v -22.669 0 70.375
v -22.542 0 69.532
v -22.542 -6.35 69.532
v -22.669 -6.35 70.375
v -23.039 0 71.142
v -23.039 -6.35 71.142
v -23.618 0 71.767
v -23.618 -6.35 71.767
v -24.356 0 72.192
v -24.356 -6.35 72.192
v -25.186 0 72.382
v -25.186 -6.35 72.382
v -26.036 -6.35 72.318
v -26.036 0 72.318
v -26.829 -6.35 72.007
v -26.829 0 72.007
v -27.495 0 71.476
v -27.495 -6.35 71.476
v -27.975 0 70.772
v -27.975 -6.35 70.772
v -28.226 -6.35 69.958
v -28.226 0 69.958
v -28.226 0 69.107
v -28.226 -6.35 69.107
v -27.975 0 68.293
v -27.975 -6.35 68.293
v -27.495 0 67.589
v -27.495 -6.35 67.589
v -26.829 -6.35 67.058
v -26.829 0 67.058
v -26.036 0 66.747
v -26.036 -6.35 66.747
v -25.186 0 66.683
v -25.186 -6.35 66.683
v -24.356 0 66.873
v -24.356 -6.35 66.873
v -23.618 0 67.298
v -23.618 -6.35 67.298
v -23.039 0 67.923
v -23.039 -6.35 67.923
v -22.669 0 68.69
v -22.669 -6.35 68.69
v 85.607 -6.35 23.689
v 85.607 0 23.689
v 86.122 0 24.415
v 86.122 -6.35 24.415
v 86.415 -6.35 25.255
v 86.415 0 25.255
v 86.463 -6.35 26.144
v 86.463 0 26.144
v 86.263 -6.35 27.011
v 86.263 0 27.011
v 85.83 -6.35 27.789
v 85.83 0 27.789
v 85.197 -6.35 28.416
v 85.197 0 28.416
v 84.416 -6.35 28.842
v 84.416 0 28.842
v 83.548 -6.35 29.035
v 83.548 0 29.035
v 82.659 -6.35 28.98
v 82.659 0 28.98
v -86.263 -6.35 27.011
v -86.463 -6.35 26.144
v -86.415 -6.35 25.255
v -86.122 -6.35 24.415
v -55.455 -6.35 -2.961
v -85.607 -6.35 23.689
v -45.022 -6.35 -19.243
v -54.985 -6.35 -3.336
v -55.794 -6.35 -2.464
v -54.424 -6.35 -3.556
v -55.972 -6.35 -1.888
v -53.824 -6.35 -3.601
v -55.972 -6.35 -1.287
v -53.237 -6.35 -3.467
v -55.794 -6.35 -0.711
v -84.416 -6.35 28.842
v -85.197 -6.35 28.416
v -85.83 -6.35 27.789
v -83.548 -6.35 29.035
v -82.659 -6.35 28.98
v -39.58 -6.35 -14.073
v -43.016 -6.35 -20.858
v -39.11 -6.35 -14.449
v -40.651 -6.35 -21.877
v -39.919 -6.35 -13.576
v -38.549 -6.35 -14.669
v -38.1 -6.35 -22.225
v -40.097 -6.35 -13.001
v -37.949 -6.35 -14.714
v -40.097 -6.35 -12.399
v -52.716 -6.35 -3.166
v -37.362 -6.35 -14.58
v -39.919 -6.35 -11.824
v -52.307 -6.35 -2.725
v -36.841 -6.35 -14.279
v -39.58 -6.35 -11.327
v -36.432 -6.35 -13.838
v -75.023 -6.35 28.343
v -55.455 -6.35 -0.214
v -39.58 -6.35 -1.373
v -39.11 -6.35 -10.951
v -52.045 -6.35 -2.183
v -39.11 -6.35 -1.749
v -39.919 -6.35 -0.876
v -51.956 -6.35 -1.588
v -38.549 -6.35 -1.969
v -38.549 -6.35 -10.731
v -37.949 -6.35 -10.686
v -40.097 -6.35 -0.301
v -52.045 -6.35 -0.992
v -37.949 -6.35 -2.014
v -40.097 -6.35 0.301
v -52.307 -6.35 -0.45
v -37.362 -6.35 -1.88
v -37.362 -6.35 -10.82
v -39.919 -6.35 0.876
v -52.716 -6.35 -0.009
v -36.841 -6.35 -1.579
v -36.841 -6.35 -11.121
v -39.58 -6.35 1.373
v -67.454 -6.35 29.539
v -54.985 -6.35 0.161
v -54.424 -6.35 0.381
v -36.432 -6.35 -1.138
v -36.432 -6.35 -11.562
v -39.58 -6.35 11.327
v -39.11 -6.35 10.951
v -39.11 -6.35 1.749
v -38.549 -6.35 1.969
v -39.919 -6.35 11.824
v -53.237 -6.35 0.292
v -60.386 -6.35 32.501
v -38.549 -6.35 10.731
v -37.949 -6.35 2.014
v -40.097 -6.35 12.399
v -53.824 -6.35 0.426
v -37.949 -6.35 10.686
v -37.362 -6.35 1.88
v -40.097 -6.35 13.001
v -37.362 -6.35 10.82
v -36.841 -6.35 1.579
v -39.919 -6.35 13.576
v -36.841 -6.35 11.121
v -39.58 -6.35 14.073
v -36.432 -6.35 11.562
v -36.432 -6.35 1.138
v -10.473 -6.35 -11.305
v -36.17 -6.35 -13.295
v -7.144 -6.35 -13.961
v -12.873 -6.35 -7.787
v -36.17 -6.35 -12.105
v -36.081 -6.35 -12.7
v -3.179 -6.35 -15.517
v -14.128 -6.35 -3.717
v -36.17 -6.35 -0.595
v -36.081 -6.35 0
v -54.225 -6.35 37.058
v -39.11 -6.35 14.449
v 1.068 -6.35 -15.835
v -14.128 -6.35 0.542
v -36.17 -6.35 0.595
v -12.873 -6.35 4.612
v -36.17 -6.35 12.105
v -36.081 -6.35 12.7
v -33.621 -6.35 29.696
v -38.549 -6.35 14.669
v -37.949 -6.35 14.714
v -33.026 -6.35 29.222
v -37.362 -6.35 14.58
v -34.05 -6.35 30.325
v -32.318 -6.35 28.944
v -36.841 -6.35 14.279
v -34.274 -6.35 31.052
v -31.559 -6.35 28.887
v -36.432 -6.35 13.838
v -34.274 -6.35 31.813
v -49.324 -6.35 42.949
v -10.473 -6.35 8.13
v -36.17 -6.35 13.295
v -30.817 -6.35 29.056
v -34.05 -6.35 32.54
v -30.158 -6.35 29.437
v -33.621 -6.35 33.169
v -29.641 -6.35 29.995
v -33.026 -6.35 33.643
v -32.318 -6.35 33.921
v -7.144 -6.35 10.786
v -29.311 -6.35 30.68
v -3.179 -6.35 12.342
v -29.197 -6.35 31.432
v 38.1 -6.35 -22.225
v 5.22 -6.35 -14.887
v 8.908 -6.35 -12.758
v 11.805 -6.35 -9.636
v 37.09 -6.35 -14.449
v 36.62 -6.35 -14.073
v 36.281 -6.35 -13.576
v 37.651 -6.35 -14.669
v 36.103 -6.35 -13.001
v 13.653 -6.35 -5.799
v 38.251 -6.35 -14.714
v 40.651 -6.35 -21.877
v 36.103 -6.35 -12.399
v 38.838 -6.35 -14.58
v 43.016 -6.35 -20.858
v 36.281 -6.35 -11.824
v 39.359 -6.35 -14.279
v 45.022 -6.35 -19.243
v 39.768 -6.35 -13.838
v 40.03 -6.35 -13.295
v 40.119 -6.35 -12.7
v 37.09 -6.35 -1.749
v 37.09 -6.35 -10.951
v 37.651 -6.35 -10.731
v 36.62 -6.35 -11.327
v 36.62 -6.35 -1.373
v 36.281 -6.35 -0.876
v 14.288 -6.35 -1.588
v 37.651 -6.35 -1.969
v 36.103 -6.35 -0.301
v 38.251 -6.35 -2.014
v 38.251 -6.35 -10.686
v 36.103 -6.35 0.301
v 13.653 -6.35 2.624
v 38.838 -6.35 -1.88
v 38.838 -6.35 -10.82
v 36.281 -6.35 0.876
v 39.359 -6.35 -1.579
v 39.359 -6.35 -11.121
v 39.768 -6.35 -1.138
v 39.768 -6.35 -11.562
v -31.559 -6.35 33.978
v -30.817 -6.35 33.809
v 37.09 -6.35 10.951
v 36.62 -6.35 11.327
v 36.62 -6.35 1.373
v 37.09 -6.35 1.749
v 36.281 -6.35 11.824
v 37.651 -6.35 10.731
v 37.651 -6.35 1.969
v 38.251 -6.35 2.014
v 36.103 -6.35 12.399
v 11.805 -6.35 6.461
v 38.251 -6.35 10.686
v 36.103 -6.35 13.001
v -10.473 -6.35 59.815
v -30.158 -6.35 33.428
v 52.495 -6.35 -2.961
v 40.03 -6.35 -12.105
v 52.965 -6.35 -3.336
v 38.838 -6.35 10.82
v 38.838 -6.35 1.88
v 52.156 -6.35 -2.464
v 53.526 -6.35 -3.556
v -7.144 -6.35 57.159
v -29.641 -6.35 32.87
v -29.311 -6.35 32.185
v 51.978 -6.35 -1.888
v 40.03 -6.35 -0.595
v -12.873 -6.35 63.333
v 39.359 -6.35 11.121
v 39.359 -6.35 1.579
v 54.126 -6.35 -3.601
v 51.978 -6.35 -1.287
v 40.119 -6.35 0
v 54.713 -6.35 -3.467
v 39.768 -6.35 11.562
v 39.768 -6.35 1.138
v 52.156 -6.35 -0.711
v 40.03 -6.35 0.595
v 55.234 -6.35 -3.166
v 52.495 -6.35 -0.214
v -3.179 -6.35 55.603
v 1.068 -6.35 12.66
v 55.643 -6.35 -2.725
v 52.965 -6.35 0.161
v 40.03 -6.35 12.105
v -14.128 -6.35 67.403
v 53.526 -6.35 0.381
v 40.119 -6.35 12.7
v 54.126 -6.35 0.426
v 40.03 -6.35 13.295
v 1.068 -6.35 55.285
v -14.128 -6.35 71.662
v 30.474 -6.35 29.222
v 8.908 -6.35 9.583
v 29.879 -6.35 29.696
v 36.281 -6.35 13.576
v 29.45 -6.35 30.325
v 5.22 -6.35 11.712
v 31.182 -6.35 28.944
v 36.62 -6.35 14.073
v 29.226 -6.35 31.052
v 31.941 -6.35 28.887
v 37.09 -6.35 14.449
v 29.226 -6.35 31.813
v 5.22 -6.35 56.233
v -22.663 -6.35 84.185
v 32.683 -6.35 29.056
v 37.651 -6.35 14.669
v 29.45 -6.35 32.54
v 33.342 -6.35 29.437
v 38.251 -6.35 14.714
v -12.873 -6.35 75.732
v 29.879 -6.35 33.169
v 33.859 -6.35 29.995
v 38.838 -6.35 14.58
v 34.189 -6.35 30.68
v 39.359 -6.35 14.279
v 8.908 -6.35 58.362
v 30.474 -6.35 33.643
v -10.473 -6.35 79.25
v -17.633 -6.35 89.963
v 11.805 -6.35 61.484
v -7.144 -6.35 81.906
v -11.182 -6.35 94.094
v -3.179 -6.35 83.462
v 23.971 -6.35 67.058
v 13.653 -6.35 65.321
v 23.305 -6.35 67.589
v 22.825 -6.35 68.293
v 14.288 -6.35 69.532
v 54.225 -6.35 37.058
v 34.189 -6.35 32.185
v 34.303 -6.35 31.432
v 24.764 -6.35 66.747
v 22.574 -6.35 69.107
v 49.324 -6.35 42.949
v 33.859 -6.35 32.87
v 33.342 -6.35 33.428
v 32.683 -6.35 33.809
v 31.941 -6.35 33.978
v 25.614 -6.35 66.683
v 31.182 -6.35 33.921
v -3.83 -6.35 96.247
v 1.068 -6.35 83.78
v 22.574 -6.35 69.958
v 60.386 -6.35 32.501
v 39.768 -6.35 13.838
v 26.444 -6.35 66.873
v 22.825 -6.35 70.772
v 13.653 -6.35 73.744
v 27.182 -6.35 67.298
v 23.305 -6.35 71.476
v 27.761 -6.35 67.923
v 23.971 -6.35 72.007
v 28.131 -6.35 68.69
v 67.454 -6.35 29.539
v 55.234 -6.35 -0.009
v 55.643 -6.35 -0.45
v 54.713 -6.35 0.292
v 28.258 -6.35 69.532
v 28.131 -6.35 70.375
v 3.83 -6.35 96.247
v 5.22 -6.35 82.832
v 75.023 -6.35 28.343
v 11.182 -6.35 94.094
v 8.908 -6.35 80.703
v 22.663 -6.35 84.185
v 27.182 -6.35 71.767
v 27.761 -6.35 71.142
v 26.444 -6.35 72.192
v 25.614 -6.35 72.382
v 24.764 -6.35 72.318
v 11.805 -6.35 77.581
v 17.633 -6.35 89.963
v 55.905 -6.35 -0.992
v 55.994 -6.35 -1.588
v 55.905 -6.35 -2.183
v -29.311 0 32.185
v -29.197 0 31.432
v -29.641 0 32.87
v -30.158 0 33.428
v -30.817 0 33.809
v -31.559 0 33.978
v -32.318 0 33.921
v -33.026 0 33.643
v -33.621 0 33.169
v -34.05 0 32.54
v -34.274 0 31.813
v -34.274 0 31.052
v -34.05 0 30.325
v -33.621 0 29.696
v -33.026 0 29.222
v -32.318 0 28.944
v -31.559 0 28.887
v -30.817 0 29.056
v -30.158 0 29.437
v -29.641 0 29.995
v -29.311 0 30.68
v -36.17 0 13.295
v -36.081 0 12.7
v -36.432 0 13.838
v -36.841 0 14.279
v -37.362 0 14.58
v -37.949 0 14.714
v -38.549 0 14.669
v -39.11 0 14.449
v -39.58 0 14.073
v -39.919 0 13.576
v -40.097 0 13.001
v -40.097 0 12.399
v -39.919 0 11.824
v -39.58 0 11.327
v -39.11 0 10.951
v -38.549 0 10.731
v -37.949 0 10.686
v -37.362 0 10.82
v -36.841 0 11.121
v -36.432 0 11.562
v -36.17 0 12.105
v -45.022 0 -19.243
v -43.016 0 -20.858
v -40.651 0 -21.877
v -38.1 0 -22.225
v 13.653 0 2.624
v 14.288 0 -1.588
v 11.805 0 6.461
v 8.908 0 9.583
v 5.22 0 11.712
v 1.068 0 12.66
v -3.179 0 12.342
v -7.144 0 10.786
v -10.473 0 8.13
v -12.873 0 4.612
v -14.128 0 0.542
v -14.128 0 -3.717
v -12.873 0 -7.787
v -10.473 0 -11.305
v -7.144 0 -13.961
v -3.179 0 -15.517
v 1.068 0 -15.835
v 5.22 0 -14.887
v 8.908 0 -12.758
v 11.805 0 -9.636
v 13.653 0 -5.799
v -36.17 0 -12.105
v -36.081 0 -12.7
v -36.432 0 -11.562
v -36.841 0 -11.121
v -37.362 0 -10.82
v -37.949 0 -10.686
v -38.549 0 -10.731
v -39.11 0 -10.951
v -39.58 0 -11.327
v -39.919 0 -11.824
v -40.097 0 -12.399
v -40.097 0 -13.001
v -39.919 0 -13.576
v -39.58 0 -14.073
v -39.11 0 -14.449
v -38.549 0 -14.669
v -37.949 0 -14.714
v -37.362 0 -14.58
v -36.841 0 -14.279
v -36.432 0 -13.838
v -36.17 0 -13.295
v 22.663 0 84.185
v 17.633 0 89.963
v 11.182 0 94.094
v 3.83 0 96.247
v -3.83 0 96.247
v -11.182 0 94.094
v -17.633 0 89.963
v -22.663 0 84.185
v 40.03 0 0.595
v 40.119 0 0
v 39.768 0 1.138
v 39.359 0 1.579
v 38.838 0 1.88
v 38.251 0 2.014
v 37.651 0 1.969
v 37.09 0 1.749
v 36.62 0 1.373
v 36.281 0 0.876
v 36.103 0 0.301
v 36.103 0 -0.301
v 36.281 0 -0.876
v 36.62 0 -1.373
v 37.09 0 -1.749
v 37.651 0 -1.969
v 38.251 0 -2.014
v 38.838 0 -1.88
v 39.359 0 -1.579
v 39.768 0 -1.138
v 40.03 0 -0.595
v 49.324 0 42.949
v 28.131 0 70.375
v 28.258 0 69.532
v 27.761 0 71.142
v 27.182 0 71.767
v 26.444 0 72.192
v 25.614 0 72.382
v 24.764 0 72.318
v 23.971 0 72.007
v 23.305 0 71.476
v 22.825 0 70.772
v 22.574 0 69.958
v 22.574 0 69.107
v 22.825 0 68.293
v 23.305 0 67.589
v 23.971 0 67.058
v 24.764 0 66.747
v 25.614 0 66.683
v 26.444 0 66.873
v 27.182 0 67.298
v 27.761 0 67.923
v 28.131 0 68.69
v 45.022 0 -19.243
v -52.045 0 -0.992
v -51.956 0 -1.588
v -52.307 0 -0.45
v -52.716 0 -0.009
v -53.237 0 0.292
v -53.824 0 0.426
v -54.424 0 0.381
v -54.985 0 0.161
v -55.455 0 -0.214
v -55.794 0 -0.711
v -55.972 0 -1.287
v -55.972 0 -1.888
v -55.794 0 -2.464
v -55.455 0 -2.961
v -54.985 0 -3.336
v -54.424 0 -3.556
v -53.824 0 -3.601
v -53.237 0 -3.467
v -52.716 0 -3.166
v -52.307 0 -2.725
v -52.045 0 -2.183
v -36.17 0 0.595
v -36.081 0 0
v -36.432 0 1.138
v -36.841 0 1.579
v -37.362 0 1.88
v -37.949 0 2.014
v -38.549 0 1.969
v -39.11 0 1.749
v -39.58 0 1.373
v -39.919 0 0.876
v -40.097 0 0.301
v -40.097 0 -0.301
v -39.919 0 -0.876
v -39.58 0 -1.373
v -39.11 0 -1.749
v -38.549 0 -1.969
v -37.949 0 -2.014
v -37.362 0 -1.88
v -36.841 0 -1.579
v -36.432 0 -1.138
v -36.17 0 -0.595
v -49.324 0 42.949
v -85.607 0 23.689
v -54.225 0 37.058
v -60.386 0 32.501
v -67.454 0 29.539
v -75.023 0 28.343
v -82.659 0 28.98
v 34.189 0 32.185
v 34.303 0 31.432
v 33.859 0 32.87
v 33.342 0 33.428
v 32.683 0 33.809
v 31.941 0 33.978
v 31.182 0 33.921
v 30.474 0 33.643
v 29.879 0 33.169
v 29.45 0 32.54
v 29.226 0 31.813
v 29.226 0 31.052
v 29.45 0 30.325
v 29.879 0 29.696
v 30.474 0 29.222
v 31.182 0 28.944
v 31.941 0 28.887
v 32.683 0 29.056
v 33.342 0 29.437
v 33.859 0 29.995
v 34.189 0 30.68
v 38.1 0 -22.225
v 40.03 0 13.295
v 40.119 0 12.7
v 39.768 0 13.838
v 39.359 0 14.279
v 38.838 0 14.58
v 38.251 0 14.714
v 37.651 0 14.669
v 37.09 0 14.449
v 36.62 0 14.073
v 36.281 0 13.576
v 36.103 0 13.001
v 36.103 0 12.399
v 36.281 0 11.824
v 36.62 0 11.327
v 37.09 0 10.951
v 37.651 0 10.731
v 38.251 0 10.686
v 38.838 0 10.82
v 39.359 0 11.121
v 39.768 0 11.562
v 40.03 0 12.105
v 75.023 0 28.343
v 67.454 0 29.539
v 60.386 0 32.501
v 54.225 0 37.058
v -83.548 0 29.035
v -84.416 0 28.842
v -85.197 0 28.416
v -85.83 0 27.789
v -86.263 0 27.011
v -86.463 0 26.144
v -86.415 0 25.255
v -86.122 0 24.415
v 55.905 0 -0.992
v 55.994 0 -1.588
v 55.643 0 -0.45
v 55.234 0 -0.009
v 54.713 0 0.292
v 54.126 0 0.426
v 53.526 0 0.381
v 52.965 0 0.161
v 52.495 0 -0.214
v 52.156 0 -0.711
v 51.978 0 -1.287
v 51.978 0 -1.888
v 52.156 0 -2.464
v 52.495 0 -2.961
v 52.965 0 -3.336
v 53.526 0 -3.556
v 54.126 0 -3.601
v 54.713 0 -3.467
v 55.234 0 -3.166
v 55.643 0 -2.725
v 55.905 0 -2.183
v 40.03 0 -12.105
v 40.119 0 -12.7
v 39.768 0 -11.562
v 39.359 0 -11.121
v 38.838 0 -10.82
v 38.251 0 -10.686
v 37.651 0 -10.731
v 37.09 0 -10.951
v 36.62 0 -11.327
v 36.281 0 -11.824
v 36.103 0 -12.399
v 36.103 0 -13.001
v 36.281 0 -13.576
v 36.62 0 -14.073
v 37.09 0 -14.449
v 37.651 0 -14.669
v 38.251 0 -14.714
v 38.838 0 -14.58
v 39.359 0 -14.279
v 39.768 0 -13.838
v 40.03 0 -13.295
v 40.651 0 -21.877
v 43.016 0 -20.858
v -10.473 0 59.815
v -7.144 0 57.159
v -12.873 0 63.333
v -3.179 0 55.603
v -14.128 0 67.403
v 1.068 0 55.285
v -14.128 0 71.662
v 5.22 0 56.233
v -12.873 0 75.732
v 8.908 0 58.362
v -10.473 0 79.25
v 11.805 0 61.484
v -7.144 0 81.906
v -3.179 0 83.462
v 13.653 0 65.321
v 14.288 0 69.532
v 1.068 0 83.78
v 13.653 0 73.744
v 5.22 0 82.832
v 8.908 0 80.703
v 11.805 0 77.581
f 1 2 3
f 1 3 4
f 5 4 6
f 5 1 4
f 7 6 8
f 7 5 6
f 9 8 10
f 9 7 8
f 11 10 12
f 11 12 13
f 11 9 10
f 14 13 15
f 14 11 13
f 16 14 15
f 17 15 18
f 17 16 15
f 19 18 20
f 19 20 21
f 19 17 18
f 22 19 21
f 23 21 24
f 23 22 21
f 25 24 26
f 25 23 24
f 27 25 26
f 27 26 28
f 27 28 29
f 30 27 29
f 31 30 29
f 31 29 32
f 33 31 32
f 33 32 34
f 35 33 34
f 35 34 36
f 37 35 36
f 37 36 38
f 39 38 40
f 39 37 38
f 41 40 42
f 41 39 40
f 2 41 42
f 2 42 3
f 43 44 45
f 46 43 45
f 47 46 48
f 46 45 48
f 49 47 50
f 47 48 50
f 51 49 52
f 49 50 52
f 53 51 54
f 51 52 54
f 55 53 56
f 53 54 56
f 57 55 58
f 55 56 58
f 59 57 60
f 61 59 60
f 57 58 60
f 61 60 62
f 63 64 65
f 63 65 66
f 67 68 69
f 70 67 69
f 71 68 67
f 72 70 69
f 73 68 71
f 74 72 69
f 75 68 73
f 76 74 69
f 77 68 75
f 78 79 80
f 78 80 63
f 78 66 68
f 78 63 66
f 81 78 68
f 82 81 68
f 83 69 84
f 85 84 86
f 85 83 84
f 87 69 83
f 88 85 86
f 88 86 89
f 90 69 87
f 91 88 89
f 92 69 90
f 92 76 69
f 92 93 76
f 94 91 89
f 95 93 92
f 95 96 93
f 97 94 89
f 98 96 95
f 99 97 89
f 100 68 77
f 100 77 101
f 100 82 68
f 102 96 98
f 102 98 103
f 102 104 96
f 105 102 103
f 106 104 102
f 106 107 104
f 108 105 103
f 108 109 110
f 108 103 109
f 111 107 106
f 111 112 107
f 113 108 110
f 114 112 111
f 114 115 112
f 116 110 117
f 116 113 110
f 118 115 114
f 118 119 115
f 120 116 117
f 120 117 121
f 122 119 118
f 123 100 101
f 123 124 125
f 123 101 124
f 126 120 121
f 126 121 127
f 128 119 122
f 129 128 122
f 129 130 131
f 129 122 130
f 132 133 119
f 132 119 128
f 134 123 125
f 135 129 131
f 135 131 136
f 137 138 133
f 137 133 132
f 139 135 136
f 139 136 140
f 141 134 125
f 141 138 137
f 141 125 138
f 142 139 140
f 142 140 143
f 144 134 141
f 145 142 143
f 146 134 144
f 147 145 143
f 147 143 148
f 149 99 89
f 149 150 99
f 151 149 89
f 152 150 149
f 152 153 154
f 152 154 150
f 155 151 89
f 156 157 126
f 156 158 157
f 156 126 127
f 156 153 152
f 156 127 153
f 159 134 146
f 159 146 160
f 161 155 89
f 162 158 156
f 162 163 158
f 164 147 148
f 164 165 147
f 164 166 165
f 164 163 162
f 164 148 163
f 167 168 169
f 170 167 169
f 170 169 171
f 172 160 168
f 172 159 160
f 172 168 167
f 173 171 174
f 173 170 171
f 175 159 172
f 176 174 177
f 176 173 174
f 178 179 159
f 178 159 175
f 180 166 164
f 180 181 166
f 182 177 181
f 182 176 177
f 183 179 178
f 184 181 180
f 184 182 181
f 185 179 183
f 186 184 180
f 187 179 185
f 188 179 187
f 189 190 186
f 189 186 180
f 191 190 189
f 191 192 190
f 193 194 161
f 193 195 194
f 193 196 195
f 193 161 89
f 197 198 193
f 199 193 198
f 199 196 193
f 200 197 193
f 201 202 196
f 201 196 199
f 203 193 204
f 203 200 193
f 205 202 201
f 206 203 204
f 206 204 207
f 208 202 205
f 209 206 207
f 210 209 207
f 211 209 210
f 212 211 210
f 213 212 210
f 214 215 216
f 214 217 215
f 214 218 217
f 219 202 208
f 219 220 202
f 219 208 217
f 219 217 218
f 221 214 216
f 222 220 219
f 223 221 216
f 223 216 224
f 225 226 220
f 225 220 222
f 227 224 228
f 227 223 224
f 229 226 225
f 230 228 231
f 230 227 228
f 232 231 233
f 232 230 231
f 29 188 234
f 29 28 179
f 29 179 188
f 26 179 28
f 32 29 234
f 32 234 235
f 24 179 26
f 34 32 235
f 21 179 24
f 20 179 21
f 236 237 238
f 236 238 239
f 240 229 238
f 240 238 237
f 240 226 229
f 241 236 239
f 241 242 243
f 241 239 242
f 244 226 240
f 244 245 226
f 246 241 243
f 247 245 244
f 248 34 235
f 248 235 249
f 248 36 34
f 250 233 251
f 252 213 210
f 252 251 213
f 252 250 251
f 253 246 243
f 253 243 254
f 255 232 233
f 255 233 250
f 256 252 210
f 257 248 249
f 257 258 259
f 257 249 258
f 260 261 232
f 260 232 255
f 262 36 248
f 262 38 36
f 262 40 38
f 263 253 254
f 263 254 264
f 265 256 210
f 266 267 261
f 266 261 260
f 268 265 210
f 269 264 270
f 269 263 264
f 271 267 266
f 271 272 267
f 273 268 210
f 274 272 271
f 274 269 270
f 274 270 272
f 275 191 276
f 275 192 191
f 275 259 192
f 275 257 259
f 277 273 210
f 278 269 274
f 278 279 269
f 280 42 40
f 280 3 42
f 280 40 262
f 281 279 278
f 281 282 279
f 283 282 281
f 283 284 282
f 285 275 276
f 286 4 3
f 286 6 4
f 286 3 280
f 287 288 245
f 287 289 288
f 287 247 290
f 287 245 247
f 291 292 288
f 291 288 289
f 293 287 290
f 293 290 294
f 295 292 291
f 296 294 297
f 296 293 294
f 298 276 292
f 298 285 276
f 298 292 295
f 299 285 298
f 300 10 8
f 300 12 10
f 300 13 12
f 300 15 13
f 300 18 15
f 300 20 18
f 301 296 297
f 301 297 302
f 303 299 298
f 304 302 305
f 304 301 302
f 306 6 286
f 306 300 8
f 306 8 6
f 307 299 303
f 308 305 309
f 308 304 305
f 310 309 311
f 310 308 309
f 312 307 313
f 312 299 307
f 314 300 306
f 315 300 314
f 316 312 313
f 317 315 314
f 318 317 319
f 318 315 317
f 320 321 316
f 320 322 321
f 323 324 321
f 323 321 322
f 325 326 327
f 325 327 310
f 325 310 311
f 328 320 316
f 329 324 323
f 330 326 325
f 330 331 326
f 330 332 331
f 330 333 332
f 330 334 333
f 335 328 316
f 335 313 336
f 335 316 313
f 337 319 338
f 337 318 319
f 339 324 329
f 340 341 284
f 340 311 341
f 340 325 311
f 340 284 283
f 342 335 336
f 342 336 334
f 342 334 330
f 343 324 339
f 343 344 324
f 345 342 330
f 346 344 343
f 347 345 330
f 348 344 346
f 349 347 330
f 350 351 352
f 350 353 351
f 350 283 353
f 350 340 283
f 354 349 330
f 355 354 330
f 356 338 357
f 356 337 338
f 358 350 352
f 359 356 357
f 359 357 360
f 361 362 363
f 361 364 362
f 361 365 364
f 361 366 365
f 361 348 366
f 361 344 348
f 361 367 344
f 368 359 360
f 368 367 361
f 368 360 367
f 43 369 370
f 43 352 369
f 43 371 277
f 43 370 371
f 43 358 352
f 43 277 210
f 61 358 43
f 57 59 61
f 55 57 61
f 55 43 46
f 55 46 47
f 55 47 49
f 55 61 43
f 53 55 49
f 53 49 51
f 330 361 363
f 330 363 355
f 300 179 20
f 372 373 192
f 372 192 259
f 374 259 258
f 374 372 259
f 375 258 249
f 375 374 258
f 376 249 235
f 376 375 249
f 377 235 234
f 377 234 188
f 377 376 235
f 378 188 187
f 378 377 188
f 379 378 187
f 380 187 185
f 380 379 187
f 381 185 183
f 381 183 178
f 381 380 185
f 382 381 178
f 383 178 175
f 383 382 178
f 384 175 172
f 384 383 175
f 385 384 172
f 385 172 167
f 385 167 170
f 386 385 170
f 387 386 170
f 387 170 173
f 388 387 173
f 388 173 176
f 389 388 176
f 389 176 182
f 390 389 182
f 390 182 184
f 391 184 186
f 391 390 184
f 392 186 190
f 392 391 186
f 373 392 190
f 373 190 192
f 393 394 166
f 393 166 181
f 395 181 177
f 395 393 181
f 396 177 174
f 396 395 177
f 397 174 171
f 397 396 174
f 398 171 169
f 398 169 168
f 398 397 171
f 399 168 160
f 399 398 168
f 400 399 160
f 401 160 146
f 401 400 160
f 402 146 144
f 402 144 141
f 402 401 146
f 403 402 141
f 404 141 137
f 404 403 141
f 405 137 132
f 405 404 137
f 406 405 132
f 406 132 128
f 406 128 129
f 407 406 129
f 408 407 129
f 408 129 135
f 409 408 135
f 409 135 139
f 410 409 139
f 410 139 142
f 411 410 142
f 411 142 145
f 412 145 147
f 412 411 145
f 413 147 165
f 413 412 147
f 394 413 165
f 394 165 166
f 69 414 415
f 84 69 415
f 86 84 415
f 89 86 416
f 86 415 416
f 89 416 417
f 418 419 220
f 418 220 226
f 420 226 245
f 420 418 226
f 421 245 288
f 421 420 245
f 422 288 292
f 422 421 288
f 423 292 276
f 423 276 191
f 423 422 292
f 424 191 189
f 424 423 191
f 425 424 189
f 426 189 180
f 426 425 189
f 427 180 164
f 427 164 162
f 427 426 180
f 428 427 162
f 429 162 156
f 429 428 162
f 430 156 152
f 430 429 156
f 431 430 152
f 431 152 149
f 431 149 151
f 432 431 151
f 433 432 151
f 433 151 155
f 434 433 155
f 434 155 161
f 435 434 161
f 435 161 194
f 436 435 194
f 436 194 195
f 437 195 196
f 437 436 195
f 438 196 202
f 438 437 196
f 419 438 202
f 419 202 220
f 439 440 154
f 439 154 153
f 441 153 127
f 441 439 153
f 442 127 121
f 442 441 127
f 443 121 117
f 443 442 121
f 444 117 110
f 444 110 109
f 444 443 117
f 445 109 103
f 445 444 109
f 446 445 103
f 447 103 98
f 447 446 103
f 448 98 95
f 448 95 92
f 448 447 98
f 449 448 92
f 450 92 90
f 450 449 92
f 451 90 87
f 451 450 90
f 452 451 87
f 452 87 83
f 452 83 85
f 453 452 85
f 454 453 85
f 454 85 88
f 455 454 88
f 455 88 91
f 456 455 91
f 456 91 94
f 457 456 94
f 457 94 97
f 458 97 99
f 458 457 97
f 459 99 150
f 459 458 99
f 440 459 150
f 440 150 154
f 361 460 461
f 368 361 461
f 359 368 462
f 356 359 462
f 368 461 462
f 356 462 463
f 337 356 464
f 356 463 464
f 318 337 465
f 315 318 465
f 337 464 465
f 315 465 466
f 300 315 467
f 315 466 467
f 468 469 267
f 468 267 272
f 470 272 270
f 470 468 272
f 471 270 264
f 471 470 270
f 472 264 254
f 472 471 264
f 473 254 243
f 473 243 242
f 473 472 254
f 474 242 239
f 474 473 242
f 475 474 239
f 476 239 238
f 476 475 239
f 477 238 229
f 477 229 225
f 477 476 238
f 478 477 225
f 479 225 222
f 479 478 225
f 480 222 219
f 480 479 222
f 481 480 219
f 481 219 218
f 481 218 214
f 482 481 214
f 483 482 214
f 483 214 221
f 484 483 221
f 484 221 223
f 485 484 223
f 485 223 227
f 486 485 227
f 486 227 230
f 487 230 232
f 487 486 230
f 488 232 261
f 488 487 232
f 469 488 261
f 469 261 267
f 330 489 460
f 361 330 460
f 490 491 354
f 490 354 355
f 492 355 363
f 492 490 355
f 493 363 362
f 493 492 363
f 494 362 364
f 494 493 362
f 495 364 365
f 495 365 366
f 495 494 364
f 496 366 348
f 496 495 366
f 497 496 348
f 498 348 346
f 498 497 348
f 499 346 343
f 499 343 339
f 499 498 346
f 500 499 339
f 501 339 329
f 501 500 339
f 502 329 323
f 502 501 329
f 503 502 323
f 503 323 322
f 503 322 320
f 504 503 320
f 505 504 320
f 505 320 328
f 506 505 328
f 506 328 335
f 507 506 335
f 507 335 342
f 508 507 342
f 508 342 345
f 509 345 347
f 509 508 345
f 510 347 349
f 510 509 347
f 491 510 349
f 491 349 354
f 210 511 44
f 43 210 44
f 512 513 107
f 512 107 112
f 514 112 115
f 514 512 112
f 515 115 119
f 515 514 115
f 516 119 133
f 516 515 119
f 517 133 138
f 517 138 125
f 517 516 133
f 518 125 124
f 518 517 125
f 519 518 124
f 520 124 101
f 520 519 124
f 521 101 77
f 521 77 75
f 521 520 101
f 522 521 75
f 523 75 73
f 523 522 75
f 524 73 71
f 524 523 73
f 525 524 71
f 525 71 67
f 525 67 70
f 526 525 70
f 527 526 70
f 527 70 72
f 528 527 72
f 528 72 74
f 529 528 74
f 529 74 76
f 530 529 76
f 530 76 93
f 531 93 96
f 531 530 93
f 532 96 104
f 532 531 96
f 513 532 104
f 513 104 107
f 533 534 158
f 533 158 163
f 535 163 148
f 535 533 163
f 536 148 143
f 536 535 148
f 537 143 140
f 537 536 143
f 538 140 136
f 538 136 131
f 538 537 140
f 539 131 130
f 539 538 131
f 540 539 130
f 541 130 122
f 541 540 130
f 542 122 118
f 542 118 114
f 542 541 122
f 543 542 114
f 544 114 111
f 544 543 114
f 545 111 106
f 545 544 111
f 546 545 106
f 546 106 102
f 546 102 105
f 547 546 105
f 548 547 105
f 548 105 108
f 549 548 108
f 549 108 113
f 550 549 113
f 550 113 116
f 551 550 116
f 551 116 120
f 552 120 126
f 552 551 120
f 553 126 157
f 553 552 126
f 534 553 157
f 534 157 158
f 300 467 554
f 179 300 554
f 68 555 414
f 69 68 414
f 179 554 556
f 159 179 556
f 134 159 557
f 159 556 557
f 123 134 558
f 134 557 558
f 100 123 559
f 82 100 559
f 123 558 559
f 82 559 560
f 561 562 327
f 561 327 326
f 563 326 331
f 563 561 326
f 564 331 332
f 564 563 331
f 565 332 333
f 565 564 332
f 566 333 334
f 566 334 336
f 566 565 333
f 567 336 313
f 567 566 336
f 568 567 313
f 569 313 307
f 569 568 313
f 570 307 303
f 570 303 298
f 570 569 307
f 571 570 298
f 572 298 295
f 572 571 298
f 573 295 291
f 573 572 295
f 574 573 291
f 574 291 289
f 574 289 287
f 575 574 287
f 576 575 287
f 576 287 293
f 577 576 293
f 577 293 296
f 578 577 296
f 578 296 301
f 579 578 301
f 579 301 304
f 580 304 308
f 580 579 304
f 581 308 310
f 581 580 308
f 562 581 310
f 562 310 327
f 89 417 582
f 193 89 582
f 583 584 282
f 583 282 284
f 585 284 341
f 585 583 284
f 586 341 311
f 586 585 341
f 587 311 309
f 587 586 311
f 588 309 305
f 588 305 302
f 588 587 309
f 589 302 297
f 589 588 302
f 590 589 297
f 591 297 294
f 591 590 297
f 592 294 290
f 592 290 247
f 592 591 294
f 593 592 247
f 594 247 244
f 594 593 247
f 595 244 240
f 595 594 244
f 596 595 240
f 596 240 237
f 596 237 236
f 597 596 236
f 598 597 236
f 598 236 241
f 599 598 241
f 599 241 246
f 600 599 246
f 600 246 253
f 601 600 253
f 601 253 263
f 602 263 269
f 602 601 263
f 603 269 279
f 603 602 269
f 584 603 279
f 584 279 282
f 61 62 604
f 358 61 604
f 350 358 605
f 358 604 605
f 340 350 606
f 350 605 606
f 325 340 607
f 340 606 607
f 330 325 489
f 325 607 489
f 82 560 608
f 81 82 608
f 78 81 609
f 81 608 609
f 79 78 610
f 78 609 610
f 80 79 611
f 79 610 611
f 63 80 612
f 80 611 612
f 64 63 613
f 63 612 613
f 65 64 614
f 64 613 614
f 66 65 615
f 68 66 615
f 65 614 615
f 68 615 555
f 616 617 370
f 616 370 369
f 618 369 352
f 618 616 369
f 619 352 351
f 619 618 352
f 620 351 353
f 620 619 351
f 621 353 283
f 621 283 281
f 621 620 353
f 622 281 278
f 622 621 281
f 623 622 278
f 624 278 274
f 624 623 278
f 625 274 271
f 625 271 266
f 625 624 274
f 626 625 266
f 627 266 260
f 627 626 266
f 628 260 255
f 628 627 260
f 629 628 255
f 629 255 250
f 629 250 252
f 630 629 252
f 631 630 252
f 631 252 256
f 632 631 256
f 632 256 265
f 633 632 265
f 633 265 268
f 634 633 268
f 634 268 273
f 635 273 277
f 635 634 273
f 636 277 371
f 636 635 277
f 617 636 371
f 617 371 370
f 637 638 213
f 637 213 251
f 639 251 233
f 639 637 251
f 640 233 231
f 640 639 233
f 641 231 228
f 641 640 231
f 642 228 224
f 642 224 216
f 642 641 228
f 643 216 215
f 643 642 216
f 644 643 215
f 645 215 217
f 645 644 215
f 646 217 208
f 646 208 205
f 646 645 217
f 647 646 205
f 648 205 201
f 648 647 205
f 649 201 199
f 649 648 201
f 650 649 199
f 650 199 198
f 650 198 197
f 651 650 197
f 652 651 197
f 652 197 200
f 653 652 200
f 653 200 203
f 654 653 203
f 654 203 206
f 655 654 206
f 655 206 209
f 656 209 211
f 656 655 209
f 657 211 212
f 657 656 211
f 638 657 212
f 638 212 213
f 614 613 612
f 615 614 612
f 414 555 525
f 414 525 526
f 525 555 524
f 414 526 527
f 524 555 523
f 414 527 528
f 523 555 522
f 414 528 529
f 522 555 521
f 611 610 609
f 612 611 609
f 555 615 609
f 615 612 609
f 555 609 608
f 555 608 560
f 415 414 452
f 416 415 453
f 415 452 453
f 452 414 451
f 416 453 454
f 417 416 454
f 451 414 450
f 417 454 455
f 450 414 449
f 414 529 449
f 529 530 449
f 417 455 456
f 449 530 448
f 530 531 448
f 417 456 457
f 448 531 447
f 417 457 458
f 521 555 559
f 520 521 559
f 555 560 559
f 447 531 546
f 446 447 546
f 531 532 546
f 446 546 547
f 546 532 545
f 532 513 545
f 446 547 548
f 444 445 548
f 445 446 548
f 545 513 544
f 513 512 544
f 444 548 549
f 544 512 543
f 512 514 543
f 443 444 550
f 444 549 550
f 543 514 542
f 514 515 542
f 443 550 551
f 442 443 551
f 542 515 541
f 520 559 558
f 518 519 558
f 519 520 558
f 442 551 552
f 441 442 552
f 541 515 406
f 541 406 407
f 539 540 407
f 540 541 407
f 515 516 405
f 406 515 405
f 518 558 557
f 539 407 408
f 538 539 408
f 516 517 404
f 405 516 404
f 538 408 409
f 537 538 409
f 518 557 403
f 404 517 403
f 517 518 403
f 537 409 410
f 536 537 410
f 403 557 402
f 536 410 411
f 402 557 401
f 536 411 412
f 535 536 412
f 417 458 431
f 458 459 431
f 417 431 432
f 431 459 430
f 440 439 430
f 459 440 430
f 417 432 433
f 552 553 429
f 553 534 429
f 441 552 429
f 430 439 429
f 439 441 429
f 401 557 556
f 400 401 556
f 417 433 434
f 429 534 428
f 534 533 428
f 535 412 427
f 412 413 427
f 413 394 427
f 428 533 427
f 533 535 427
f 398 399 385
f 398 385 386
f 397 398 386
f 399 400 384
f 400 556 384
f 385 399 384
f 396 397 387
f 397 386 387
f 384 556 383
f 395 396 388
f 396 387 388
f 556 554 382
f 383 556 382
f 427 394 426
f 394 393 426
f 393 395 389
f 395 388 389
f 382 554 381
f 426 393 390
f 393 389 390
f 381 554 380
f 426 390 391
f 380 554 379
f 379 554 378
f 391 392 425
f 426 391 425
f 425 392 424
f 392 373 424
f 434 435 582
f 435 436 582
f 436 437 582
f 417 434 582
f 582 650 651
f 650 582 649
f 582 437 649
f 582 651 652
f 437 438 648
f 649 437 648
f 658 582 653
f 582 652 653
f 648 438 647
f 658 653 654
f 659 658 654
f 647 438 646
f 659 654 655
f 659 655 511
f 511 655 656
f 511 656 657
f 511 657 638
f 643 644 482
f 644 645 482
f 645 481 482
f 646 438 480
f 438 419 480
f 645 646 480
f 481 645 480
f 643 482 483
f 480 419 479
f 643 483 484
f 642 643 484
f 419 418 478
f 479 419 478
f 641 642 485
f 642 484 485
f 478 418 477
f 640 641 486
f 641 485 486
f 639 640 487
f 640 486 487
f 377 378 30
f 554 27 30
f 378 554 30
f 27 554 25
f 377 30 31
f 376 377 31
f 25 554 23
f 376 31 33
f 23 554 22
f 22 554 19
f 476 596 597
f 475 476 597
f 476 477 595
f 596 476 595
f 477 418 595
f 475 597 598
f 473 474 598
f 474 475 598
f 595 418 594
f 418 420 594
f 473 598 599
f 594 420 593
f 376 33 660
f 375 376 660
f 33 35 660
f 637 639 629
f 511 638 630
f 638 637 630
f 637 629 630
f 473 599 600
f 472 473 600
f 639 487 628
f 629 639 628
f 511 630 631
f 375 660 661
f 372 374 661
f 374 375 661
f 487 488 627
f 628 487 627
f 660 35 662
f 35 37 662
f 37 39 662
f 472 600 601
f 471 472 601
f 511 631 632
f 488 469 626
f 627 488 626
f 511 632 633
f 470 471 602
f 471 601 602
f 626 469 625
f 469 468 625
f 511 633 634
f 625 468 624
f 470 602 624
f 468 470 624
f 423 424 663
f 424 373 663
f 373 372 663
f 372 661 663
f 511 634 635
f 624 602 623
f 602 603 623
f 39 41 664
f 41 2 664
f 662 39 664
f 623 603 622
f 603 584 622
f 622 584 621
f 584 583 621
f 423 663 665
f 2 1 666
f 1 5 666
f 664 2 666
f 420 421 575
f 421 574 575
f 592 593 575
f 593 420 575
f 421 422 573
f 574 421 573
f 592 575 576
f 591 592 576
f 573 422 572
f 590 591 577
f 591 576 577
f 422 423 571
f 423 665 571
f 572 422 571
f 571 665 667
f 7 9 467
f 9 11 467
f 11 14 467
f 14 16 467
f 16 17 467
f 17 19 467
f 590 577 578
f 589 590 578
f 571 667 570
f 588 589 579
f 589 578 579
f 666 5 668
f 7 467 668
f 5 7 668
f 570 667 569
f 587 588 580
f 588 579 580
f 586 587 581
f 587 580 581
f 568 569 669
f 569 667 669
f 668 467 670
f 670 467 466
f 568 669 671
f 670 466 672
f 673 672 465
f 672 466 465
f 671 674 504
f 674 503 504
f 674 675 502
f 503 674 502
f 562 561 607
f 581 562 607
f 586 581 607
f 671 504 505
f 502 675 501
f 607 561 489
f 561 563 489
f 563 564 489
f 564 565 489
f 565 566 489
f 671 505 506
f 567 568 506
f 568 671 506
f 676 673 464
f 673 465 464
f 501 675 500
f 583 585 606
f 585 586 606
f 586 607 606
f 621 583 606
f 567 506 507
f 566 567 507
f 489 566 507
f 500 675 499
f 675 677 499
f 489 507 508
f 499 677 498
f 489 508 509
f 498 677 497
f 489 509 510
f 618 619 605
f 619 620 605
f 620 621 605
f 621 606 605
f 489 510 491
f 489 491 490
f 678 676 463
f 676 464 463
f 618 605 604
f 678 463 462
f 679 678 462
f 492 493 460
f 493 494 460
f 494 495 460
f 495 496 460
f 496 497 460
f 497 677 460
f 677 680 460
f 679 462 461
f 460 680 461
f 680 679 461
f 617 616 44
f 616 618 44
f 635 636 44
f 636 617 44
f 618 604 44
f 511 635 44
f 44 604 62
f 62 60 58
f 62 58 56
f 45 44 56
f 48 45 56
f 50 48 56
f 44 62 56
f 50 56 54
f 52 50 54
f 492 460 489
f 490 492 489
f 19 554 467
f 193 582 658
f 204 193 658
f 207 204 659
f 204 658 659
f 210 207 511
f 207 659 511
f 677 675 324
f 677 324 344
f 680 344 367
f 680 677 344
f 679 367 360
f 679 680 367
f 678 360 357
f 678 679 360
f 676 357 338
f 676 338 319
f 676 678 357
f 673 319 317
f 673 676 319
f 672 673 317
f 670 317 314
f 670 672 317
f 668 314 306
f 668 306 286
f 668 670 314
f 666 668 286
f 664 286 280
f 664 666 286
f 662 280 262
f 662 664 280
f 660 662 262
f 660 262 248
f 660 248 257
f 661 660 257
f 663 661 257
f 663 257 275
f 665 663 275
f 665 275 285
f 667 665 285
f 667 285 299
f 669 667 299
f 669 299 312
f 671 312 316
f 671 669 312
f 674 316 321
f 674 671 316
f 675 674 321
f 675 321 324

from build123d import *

# Parameters (mm, degrees)
F0_R     = 2.0193
F0_R_2   = 14.2875
F0_R_3   = 2.5527
F0_R_4   = 2.8575
F1_DEPTH = 6.35


with BuildPart() as f1:
    # F0 (on Front) → F1 (new body)
    with BuildSketch(Plane.XZ):
        with BuildLine():
            ThreePointArc((-49.323942, 42.948766), (-63.830824, 30.807895), (-82.659198, 28.979589))
            ThreePointArc((-82.659198, 28.979589), (-86.073502, 27.415326), (-85.607225, 23.688803))
            Line((-85.607225, 23.688803), (-45.021703, -19.243367))
            ThreePointArc((-45.021703, -19.243367), (-41.868292, -21.447891), (-38.1, -22.225))
            Line((-38.1, -22.225), (38.1, -22.225))
            ThreePointArc((38.1, -22.225), (41.868292, -21.447891), (45.021703, -19.243367))
            Line((45.021703, -19.243367), (85.607225, 23.688803))
            ThreePointArc((85.607225, 23.688803), (86.073502, 27.415326), (82.659198, 28.979589))
            ThreePointArc((82.659198, 28.979589), (63.830824, 30.807895), (49.323942, 42.948766))
            Line((49.323942, 42.948766), (22.663343, 84.185078))
            ThreePointArc((22.663343, 84.185078), (0, 96.52), (-22.663343, 84.185078))
            Line((-22.663343, 84.185078), (-49.323942, 42.948766))
        make_face()
        with Locations((-53.975, -1.5875)):
            Circle(F0_R, mode=Mode.SUBTRACT)
        with Locations((-38.1, -12.7)):
            Circle(F0_R, mode=Mode.SUBTRACT)
        with Locations((-38.1, 0)):
            Circle(F0_R, mode=Mode.SUBTRACT)
        with Locations((0, -1.5875)):
            Circle(F0_R_2, mode=Mode.SUBTRACT)
        with Locations((-38.1, 12.7)):
            Circle(F0_R, mode=Mode.SUBTRACT)
        with Locations((-31.75, 31.4325)):
            Circle(F0_R_3, mode=Mode.SUBTRACT)
        with Locations((38.1, -12.7)):
            Circle(F0_R, mode=Mode.SUBTRACT)
        with Locations((38.1, 0)):
            Circle(F0_R, mode=Mode.SUBTRACT)
        with Locations((53.975, -1.5875)):
            Circle(F0_R, mode=Mode.SUBTRACT)
        with Locations((38.1, 12.7)):
            Circle(F0_R, mode=Mode.SUBTRACT)
        with Locations((31.75, 31.4325)):
            Circle(F0_R_3, mode=Mode.SUBTRACT)
        with Locations((-25.4, 69.5325)):
            Circle(F0_R_4, mode=Mode.SUBTRACT)
        with Locations((0, 69.5325)):
            Circle(F0_R_2, mode=Mode.SUBTRACT)
        with Locations((25.4, 69.5325)):
            Circle(F0_R_4, mode=Mode.SUBTRACT)
    extrude(amount=F1_DEPTH)


solid = f1.part
